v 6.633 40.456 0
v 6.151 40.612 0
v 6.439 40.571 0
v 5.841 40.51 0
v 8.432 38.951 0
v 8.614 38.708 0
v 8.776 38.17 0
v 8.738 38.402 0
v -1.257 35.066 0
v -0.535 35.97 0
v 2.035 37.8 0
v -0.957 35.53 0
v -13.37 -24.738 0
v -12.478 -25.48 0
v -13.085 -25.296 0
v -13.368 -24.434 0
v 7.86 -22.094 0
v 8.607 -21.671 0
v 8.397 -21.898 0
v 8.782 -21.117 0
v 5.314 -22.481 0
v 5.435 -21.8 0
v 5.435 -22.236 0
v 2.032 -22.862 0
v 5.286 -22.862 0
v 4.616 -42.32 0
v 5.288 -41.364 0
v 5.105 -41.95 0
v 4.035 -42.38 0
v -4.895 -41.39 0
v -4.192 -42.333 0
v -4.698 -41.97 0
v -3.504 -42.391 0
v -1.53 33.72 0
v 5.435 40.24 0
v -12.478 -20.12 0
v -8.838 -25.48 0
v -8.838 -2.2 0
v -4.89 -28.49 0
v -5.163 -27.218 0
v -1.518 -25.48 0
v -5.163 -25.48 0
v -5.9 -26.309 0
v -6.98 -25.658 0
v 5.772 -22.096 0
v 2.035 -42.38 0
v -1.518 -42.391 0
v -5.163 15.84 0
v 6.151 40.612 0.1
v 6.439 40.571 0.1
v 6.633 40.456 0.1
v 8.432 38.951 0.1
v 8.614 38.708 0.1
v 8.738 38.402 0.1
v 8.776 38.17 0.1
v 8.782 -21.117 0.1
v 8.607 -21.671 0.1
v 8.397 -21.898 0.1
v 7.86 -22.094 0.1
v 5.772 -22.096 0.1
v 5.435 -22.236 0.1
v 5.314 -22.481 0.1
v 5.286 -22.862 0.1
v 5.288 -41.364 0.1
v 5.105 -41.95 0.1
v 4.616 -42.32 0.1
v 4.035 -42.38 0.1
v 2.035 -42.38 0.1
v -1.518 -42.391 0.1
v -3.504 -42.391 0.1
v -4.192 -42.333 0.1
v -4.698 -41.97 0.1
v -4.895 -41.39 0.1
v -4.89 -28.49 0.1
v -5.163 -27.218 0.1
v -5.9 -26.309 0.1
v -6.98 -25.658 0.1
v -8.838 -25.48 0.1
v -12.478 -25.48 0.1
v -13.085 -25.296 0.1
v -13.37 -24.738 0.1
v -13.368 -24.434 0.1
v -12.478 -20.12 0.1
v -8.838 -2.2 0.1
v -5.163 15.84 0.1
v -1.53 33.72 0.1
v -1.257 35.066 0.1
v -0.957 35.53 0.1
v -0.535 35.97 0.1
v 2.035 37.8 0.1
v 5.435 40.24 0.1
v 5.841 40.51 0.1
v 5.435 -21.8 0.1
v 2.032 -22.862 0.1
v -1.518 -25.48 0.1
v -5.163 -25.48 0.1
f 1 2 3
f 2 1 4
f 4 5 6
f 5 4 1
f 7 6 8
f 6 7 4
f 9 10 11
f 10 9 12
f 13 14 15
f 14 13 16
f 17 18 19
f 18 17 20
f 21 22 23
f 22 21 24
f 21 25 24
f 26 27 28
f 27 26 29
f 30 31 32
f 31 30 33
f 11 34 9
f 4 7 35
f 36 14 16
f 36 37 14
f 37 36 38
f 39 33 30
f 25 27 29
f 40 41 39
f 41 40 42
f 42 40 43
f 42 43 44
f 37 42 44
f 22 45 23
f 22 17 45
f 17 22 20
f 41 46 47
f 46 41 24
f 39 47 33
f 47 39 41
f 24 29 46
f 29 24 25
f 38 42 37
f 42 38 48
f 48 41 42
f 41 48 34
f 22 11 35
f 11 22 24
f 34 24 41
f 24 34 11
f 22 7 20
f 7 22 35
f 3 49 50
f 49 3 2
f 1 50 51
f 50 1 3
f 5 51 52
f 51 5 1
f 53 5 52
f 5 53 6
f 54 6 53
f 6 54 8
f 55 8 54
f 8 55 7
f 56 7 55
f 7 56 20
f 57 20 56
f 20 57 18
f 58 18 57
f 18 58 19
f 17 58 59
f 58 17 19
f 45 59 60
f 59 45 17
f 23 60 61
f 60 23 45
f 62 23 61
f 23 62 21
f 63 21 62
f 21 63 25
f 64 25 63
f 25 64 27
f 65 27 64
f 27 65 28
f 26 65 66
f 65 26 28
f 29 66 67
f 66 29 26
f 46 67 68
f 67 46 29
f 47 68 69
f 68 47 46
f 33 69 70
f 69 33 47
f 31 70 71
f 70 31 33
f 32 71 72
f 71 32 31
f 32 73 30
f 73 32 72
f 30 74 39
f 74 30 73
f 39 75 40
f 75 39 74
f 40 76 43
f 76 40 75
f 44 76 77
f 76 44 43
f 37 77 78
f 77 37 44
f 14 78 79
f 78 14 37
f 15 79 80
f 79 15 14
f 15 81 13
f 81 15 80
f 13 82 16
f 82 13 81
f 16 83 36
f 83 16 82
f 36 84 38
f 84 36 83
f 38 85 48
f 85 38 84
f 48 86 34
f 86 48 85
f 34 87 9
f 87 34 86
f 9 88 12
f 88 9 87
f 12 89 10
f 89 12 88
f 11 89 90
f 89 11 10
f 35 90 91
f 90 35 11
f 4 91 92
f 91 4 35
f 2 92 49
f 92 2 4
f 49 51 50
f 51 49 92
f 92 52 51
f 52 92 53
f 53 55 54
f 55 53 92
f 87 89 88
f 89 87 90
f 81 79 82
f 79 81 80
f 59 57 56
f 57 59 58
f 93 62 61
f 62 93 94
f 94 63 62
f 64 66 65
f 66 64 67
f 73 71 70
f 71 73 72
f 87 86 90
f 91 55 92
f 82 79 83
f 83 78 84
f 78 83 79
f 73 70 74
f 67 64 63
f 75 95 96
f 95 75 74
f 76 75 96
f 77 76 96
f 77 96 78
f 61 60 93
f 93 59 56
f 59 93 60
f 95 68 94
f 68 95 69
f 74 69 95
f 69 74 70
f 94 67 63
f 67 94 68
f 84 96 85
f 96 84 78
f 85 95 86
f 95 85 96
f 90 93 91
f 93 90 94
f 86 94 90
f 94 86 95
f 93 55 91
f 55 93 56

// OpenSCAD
// file: s/13710gs02.scad
use <../../lib.scad>
function ldraw_lib__s__13710gs02() = [
// 0 ~Sticker Top for Technic Panel Fairing Smooth (Long) Flat
// 0 Name: s\13710gs02.dat
// 0 Author: Philippe Hurbain [Philo]
// 0 !LDRAW_ORG Subpart UPDATE 2022-02
// 0 !LICENSE Licensed under CC BY 2.0 and CC BY 4.0 : see CAreadme.txt
// 
// 0 BFC CERTIFY CCW
  [0,"BFC","CERTIFY"],
  [0,"BFC","CCW"],
// 
// 0 !HISTORY 2022-03-06 [PTadmin] Official Update 2022-02
// 
// 
// 0 // Top surface
// 4 16 -14.602 -0.25 101.275 -15.378 -0.25 101.529 -16.097 -0.25 101.427 -16.582 -0.25 101.141
  [4,16,-14.602,-0.25,101.275,-15.378,-0.25,101.529,-16.097,-0.25,101.427,-16.582,-0.25,101.141],
// 4 16 -14.602 -0.25 101.275 -16.582 -0.25 101.141 -21.08 -0.25 97.378 -21.536 -0.25 96.769
  [4,16,-14.602,-0.25,101.275,-16.582,-0.25,101.141,-21.08,-0.25,97.378,-21.536,-0.25,96.769],
// 4 16 -14.602 -0.25 101.275 -21.536 -0.25 96.769 -21.844 -0.25 96.005 -21.94 -0.25 95.424
  [4,16,-14.602,-0.25,101.275,-21.536,-0.25,96.769,-21.844,-0.25,96.005,-21.94,-0.25,95.424],
// 4 16 3.142 -0.25 87.664 2.393 -0.25 88.826 1.338 -0.25 89.925 -5.087 -0.25 94.5
  [4,16,3.142,-0.25,87.664,2.393,-0.25,88.826,1.338,-0.25,89.925,-5.087,-0.25,94.5],
// 4 16 31.196 -0.25 -63.7 32.713 -0.25 -63.241 33.424 -0.25 -61.844 33.421 -0.25 -61.086
  [4,16,31.196,-0.25,-63.7,32.713,-0.25,-63.241,33.424,-0.25,-61.844,33.421,-0.25,-61.086],
// 4 16 -21.954 -0.25 -52.792 -21.518 -0.25 -54.177 -20.993 -0.25 -54.745 -19.65 -0.25 -55.236
  [4,16,-21.954,-0.25,-52.792,-21.518,-0.25,-54.177,-20.993,-0.25,-54.745,-19.65,-0.25,-55.236],
// 4 16 -13.588 -0.25 -55.589 -13.286 -0.25 -56.203 -5.08 -0.25 -57.154 -13.588 -0.25 -54.5
  [4,16,-13.588,-0.25,-55.589,-13.286,-0.25,-56.203,-5.08,-0.25,-57.154,-13.588,-0.25,-54.5],
// 3 16 -13.286 -0.25 -56.203 -13.216 -0.25 -57.156 -5.08 -0.25 -57.154
  [3,16,-13.286,-0.25,-56.203,-13.216,-0.25,-57.156,-5.08,-0.25,-57.154],
// 4 16 -13.22 -0.25 -103.409 -12.762 -0.25 -104.875 -11.54 -0.25 -105.799 -10.088 -0.25 -105.95
  [4,16,-13.22,-0.25,-103.409,-12.762,-0.25,-104.875,-11.54,-0.25,-105.799,-10.088,-0.25,-105.95],
// 4 16 8.76 -0.25 -105.977 10.481 -0.25 -105.833 11.744 -0.25 -104.924 12.237 -0.25 -103.474
  [4,16,8.76,-0.25,-105.977,10.481,-0.25,-105.833,11.744,-0.25,-104.924,12.237,-0.25,-103.474],
// 3 16 -5.087 -0.25 94.5 3.826 -0.25 84.3 3.142 -0.25 87.664
  [3,16,-5.087,-0.25,94.5,3.826,-0.25,84.3,3.142,-0.25,87.664],
// 3 16 -14.602 -0.25 101.275 -21.94 -0.25 95.424 -13.588 -0.25 100.6
  [3,16,-14.602,-0.25,101.275,-21.94,-0.25,95.424,-13.588,-0.25,100.6],
// 3 16 31.196 -0.25 -50.3 31.196 -0.25 -63.7 33.421 -0.25 -61.086
  [3,16,31.196,-0.25,-50.3,31.196,-0.25,-63.7,33.421,-0.25,-61.086],
// 4 16 22.095 -0.25 -63.7 31.196 -0.25 -63.7 31.196 -0.25 -50.3 22.095 -0.25 -5.5
  [4,16,22.095,-0.25,-63.7,31.196,-0.25,-63.7,31.196,-0.25,-50.3,22.095,-0.25,-5.5],
// 3 16 12.225 -0.25 -71.225 8.76 -0.25 -105.977 12.237 -0.25 -103.474
  [3,16,12.225,-0.25,-71.225,8.76,-0.25,-105.977,12.237,-0.25,-103.474],
// 3 16 -13.216 -0.25 -57.156 -13.22 -0.25 -103.409 -10.088 -0.25 -105.95
  [3,16,-13.216,-0.25,-57.156,-13.22,-0.25,-103.409,-10.088,-0.25,-105.95],
// 4 16 3.795 -0.25 -63.7 12.225 -0.25 -71.225 12.908 -0.25 -68.044 12.908 -0.25 -63.7
  [4,16,3.795,-0.25,-63.7,12.225,-0.25,-71.225,12.908,-0.25,-68.044,12.908,-0.25,-63.7],
// 3 16 12.908 -0.25 -63.7 12.908 -0.25 -68.044 14.749 -0.25 -65.772
  [3,16,12.908,-0.25,-63.7,12.908,-0.25,-68.044,14.749,-0.25,-65.772],
// 3 16 12.908 -0.25 -63.7 14.749 -0.25 -65.772 17.451 -0.25 -64.144
  [3,16,12.908,-0.25,-63.7,14.749,-0.25,-65.772,17.451,-0.25,-64.144],
// 3 16 22.095 -0.25 -63.7 12.908 -0.25 -63.7 17.451 -0.25 -64.144
  [3,16,22.095,-0.25,-63.7,12.908,-0.25,-63.7,17.451,-0.25,-64.144],
// 3 16 -13.588 -0.25 -54.5 -14.429 -0.25 -55.241 -13.588 -0.25 -55.589
  [3,16,-13.588,-0.25,-54.5,-14.429,-0.25,-55.241,-13.588,-0.25,-55.589],
// 4 16 -19.65 -0.25 -55.236 -14.429 -0.25 -55.241 -13.588 -0.25 -54.5 -21.954 -0.25 -52.792
  [4,16,-19.65,-0.25,-55.236,-14.429,-0.25,-55.241,-13.588,-0.25,-54.5,-21.954,-0.25,-52.792],
// 4 16 -5.08 -0.25 -57.154 -5.087 -0.25 -105.95 3.795 -0.25 -105.977 3.795 -0.25 -63.7
  [4,16,-5.08,-0.25,-57.154,-5.087,-0.25,-105.95,3.795,-0.25,-105.977,3.795,-0.25,-63.7],
// 4 16 3.795 -0.25 -63.7 3.795 -0.25 -105.977 8.76 -0.25 -105.977 12.225 -0.25 -71.225
  [4,16,3.795,-0.25,-63.7,3.795,-0.25,-105.977,8.76,-0.25,-105.977,12.225,-0.25,-71.225],
// 4 16 -10.088 -0.25 -105.95 -5.087 -0.25 -105.95 -5.08 -0.25 -57.154 -13.216 -0.25 -57.156
  [4,16,-10.088,-0.25,-105.95,-5.087,-0.25,-105.95,-5.08,-0.25,-57.154,-13.216,-0.25,-57.156],
// 4 16 12.908 -0.25 -63.7 22.095 -0.25 -63.7 22.095 -0.25 -5.5 12.908 -0.25 39.6
  [4,16,12.908,-0.25,-63.7,22.095,-0.25,-63.7,22.095,-0.25,-5.5,12.908,-0.25,39.6],
// 4 16 3.795 -0.25 -63.7 12.908 -0.25 -63.7 12.908 -0.25 39.6 3.826 -0.25 84.3
  [4,16,3.795,-0.25,-63.7,12.908,-0.25,-63.7,12.908,-0.25,39.6,3.826,-0.25,84.3],
// 4 16 -5.087 -0.25 94.5 -13.588 -0.25 100.6 -13.588 -0.25 -54.5 -5.08 -0.25 -57.154
  [4,16,-5.087,-0.25,94.5,-13.588,-0.25,100.6,-13.588,-0.25,-54.5,-5.08,-0.25,-57.154],
// 4 16 3.826 -0.25 84.3 -5.087 -0.25 94.5 -5.08 -0.25 -57.154 3.795 -0.25 -63.7
  [4,16,3.826,-0.25,84.3,-5.087,-0.25,94.5,-5.08,-0.25,-57.154,3.795,-0.25,-63.7],
// 4 16 -13.588 -0.25 100.6 -21.94 -0.25 95.424 -21.954 -0.25 -52.792 -13.588 -0.25 -54.5
  [4,16,-13.588,-0.25,100.6,-21.94,-0.25,95.424,-21.954,-0.25,-52.792,-13.588,-0.25,-54.5],
];
makepoly(ldraw_lib__s__13710gs02(), line=0.2);
// main file
use <../lib.scad>
use <s/13710gs01.scad>
use <s/13710gs02.scad>
function ldraw_lib__13710n() = [
// 0 Sticker Mindstorms EV3 #14 for Panel Smooth Long (Needs Work)
// 0 Name: 13710n.dat
// 0 Author: Philippe Hurbain [Philo]
// 0 !LDRAW_ORG Part UPDATE 2022-02
// 0 !LICENSE Licensed under CC BY 2.0 and CC BY 4.0 : see CAreadme.txt
// 
// 0 !HELP To be used with panel 64681
// 
// 0 BFC CERTIFY CCW
  [0,"BFC","CERTIFY"],
  [0,"BFC","CCW"],
// 
// 0 !HISTORY 2022-03-06 [PTadmin] Official Update 2022-02
// 
// 
// 0 // Image file courtesy of the LEGO MINDSTORMS Team
// 0 // Needs Work: Missing more detailed fallback pattern
// 
// 1 16 0 0 0 -1 0 0 0 1 0 0 0 1 s\13710gs01.dat
  [1,16,0,0,0,-1,0,0,0,1,0,0,0,1, ldraw_lib__s__13710gs01()],
// 0 !TEXMAP START PLANAR -33.424 12.0264 -105.977 -33.424 12.0264 101.529 21.954 12.0264 -105.977 13710n.png
// 0 !: 1 15 0 0 0 -1 0 0 0 1 0 0 0 1 s\13710gs02.dat
// 0 !TEXMAP FALLBACK
// 1 15 0 0 0 -1 0 0 0 1 0 0 0 1 s\13710gs02.dat
  [1,15,0,0,0,-1,0,0,0,1,0,0,0,1, ldraw_lib__s__13710gs02()],
// 0 !TEXMAP END
];
makepoly(ldraw_lib__13710n(), line=0.2);
